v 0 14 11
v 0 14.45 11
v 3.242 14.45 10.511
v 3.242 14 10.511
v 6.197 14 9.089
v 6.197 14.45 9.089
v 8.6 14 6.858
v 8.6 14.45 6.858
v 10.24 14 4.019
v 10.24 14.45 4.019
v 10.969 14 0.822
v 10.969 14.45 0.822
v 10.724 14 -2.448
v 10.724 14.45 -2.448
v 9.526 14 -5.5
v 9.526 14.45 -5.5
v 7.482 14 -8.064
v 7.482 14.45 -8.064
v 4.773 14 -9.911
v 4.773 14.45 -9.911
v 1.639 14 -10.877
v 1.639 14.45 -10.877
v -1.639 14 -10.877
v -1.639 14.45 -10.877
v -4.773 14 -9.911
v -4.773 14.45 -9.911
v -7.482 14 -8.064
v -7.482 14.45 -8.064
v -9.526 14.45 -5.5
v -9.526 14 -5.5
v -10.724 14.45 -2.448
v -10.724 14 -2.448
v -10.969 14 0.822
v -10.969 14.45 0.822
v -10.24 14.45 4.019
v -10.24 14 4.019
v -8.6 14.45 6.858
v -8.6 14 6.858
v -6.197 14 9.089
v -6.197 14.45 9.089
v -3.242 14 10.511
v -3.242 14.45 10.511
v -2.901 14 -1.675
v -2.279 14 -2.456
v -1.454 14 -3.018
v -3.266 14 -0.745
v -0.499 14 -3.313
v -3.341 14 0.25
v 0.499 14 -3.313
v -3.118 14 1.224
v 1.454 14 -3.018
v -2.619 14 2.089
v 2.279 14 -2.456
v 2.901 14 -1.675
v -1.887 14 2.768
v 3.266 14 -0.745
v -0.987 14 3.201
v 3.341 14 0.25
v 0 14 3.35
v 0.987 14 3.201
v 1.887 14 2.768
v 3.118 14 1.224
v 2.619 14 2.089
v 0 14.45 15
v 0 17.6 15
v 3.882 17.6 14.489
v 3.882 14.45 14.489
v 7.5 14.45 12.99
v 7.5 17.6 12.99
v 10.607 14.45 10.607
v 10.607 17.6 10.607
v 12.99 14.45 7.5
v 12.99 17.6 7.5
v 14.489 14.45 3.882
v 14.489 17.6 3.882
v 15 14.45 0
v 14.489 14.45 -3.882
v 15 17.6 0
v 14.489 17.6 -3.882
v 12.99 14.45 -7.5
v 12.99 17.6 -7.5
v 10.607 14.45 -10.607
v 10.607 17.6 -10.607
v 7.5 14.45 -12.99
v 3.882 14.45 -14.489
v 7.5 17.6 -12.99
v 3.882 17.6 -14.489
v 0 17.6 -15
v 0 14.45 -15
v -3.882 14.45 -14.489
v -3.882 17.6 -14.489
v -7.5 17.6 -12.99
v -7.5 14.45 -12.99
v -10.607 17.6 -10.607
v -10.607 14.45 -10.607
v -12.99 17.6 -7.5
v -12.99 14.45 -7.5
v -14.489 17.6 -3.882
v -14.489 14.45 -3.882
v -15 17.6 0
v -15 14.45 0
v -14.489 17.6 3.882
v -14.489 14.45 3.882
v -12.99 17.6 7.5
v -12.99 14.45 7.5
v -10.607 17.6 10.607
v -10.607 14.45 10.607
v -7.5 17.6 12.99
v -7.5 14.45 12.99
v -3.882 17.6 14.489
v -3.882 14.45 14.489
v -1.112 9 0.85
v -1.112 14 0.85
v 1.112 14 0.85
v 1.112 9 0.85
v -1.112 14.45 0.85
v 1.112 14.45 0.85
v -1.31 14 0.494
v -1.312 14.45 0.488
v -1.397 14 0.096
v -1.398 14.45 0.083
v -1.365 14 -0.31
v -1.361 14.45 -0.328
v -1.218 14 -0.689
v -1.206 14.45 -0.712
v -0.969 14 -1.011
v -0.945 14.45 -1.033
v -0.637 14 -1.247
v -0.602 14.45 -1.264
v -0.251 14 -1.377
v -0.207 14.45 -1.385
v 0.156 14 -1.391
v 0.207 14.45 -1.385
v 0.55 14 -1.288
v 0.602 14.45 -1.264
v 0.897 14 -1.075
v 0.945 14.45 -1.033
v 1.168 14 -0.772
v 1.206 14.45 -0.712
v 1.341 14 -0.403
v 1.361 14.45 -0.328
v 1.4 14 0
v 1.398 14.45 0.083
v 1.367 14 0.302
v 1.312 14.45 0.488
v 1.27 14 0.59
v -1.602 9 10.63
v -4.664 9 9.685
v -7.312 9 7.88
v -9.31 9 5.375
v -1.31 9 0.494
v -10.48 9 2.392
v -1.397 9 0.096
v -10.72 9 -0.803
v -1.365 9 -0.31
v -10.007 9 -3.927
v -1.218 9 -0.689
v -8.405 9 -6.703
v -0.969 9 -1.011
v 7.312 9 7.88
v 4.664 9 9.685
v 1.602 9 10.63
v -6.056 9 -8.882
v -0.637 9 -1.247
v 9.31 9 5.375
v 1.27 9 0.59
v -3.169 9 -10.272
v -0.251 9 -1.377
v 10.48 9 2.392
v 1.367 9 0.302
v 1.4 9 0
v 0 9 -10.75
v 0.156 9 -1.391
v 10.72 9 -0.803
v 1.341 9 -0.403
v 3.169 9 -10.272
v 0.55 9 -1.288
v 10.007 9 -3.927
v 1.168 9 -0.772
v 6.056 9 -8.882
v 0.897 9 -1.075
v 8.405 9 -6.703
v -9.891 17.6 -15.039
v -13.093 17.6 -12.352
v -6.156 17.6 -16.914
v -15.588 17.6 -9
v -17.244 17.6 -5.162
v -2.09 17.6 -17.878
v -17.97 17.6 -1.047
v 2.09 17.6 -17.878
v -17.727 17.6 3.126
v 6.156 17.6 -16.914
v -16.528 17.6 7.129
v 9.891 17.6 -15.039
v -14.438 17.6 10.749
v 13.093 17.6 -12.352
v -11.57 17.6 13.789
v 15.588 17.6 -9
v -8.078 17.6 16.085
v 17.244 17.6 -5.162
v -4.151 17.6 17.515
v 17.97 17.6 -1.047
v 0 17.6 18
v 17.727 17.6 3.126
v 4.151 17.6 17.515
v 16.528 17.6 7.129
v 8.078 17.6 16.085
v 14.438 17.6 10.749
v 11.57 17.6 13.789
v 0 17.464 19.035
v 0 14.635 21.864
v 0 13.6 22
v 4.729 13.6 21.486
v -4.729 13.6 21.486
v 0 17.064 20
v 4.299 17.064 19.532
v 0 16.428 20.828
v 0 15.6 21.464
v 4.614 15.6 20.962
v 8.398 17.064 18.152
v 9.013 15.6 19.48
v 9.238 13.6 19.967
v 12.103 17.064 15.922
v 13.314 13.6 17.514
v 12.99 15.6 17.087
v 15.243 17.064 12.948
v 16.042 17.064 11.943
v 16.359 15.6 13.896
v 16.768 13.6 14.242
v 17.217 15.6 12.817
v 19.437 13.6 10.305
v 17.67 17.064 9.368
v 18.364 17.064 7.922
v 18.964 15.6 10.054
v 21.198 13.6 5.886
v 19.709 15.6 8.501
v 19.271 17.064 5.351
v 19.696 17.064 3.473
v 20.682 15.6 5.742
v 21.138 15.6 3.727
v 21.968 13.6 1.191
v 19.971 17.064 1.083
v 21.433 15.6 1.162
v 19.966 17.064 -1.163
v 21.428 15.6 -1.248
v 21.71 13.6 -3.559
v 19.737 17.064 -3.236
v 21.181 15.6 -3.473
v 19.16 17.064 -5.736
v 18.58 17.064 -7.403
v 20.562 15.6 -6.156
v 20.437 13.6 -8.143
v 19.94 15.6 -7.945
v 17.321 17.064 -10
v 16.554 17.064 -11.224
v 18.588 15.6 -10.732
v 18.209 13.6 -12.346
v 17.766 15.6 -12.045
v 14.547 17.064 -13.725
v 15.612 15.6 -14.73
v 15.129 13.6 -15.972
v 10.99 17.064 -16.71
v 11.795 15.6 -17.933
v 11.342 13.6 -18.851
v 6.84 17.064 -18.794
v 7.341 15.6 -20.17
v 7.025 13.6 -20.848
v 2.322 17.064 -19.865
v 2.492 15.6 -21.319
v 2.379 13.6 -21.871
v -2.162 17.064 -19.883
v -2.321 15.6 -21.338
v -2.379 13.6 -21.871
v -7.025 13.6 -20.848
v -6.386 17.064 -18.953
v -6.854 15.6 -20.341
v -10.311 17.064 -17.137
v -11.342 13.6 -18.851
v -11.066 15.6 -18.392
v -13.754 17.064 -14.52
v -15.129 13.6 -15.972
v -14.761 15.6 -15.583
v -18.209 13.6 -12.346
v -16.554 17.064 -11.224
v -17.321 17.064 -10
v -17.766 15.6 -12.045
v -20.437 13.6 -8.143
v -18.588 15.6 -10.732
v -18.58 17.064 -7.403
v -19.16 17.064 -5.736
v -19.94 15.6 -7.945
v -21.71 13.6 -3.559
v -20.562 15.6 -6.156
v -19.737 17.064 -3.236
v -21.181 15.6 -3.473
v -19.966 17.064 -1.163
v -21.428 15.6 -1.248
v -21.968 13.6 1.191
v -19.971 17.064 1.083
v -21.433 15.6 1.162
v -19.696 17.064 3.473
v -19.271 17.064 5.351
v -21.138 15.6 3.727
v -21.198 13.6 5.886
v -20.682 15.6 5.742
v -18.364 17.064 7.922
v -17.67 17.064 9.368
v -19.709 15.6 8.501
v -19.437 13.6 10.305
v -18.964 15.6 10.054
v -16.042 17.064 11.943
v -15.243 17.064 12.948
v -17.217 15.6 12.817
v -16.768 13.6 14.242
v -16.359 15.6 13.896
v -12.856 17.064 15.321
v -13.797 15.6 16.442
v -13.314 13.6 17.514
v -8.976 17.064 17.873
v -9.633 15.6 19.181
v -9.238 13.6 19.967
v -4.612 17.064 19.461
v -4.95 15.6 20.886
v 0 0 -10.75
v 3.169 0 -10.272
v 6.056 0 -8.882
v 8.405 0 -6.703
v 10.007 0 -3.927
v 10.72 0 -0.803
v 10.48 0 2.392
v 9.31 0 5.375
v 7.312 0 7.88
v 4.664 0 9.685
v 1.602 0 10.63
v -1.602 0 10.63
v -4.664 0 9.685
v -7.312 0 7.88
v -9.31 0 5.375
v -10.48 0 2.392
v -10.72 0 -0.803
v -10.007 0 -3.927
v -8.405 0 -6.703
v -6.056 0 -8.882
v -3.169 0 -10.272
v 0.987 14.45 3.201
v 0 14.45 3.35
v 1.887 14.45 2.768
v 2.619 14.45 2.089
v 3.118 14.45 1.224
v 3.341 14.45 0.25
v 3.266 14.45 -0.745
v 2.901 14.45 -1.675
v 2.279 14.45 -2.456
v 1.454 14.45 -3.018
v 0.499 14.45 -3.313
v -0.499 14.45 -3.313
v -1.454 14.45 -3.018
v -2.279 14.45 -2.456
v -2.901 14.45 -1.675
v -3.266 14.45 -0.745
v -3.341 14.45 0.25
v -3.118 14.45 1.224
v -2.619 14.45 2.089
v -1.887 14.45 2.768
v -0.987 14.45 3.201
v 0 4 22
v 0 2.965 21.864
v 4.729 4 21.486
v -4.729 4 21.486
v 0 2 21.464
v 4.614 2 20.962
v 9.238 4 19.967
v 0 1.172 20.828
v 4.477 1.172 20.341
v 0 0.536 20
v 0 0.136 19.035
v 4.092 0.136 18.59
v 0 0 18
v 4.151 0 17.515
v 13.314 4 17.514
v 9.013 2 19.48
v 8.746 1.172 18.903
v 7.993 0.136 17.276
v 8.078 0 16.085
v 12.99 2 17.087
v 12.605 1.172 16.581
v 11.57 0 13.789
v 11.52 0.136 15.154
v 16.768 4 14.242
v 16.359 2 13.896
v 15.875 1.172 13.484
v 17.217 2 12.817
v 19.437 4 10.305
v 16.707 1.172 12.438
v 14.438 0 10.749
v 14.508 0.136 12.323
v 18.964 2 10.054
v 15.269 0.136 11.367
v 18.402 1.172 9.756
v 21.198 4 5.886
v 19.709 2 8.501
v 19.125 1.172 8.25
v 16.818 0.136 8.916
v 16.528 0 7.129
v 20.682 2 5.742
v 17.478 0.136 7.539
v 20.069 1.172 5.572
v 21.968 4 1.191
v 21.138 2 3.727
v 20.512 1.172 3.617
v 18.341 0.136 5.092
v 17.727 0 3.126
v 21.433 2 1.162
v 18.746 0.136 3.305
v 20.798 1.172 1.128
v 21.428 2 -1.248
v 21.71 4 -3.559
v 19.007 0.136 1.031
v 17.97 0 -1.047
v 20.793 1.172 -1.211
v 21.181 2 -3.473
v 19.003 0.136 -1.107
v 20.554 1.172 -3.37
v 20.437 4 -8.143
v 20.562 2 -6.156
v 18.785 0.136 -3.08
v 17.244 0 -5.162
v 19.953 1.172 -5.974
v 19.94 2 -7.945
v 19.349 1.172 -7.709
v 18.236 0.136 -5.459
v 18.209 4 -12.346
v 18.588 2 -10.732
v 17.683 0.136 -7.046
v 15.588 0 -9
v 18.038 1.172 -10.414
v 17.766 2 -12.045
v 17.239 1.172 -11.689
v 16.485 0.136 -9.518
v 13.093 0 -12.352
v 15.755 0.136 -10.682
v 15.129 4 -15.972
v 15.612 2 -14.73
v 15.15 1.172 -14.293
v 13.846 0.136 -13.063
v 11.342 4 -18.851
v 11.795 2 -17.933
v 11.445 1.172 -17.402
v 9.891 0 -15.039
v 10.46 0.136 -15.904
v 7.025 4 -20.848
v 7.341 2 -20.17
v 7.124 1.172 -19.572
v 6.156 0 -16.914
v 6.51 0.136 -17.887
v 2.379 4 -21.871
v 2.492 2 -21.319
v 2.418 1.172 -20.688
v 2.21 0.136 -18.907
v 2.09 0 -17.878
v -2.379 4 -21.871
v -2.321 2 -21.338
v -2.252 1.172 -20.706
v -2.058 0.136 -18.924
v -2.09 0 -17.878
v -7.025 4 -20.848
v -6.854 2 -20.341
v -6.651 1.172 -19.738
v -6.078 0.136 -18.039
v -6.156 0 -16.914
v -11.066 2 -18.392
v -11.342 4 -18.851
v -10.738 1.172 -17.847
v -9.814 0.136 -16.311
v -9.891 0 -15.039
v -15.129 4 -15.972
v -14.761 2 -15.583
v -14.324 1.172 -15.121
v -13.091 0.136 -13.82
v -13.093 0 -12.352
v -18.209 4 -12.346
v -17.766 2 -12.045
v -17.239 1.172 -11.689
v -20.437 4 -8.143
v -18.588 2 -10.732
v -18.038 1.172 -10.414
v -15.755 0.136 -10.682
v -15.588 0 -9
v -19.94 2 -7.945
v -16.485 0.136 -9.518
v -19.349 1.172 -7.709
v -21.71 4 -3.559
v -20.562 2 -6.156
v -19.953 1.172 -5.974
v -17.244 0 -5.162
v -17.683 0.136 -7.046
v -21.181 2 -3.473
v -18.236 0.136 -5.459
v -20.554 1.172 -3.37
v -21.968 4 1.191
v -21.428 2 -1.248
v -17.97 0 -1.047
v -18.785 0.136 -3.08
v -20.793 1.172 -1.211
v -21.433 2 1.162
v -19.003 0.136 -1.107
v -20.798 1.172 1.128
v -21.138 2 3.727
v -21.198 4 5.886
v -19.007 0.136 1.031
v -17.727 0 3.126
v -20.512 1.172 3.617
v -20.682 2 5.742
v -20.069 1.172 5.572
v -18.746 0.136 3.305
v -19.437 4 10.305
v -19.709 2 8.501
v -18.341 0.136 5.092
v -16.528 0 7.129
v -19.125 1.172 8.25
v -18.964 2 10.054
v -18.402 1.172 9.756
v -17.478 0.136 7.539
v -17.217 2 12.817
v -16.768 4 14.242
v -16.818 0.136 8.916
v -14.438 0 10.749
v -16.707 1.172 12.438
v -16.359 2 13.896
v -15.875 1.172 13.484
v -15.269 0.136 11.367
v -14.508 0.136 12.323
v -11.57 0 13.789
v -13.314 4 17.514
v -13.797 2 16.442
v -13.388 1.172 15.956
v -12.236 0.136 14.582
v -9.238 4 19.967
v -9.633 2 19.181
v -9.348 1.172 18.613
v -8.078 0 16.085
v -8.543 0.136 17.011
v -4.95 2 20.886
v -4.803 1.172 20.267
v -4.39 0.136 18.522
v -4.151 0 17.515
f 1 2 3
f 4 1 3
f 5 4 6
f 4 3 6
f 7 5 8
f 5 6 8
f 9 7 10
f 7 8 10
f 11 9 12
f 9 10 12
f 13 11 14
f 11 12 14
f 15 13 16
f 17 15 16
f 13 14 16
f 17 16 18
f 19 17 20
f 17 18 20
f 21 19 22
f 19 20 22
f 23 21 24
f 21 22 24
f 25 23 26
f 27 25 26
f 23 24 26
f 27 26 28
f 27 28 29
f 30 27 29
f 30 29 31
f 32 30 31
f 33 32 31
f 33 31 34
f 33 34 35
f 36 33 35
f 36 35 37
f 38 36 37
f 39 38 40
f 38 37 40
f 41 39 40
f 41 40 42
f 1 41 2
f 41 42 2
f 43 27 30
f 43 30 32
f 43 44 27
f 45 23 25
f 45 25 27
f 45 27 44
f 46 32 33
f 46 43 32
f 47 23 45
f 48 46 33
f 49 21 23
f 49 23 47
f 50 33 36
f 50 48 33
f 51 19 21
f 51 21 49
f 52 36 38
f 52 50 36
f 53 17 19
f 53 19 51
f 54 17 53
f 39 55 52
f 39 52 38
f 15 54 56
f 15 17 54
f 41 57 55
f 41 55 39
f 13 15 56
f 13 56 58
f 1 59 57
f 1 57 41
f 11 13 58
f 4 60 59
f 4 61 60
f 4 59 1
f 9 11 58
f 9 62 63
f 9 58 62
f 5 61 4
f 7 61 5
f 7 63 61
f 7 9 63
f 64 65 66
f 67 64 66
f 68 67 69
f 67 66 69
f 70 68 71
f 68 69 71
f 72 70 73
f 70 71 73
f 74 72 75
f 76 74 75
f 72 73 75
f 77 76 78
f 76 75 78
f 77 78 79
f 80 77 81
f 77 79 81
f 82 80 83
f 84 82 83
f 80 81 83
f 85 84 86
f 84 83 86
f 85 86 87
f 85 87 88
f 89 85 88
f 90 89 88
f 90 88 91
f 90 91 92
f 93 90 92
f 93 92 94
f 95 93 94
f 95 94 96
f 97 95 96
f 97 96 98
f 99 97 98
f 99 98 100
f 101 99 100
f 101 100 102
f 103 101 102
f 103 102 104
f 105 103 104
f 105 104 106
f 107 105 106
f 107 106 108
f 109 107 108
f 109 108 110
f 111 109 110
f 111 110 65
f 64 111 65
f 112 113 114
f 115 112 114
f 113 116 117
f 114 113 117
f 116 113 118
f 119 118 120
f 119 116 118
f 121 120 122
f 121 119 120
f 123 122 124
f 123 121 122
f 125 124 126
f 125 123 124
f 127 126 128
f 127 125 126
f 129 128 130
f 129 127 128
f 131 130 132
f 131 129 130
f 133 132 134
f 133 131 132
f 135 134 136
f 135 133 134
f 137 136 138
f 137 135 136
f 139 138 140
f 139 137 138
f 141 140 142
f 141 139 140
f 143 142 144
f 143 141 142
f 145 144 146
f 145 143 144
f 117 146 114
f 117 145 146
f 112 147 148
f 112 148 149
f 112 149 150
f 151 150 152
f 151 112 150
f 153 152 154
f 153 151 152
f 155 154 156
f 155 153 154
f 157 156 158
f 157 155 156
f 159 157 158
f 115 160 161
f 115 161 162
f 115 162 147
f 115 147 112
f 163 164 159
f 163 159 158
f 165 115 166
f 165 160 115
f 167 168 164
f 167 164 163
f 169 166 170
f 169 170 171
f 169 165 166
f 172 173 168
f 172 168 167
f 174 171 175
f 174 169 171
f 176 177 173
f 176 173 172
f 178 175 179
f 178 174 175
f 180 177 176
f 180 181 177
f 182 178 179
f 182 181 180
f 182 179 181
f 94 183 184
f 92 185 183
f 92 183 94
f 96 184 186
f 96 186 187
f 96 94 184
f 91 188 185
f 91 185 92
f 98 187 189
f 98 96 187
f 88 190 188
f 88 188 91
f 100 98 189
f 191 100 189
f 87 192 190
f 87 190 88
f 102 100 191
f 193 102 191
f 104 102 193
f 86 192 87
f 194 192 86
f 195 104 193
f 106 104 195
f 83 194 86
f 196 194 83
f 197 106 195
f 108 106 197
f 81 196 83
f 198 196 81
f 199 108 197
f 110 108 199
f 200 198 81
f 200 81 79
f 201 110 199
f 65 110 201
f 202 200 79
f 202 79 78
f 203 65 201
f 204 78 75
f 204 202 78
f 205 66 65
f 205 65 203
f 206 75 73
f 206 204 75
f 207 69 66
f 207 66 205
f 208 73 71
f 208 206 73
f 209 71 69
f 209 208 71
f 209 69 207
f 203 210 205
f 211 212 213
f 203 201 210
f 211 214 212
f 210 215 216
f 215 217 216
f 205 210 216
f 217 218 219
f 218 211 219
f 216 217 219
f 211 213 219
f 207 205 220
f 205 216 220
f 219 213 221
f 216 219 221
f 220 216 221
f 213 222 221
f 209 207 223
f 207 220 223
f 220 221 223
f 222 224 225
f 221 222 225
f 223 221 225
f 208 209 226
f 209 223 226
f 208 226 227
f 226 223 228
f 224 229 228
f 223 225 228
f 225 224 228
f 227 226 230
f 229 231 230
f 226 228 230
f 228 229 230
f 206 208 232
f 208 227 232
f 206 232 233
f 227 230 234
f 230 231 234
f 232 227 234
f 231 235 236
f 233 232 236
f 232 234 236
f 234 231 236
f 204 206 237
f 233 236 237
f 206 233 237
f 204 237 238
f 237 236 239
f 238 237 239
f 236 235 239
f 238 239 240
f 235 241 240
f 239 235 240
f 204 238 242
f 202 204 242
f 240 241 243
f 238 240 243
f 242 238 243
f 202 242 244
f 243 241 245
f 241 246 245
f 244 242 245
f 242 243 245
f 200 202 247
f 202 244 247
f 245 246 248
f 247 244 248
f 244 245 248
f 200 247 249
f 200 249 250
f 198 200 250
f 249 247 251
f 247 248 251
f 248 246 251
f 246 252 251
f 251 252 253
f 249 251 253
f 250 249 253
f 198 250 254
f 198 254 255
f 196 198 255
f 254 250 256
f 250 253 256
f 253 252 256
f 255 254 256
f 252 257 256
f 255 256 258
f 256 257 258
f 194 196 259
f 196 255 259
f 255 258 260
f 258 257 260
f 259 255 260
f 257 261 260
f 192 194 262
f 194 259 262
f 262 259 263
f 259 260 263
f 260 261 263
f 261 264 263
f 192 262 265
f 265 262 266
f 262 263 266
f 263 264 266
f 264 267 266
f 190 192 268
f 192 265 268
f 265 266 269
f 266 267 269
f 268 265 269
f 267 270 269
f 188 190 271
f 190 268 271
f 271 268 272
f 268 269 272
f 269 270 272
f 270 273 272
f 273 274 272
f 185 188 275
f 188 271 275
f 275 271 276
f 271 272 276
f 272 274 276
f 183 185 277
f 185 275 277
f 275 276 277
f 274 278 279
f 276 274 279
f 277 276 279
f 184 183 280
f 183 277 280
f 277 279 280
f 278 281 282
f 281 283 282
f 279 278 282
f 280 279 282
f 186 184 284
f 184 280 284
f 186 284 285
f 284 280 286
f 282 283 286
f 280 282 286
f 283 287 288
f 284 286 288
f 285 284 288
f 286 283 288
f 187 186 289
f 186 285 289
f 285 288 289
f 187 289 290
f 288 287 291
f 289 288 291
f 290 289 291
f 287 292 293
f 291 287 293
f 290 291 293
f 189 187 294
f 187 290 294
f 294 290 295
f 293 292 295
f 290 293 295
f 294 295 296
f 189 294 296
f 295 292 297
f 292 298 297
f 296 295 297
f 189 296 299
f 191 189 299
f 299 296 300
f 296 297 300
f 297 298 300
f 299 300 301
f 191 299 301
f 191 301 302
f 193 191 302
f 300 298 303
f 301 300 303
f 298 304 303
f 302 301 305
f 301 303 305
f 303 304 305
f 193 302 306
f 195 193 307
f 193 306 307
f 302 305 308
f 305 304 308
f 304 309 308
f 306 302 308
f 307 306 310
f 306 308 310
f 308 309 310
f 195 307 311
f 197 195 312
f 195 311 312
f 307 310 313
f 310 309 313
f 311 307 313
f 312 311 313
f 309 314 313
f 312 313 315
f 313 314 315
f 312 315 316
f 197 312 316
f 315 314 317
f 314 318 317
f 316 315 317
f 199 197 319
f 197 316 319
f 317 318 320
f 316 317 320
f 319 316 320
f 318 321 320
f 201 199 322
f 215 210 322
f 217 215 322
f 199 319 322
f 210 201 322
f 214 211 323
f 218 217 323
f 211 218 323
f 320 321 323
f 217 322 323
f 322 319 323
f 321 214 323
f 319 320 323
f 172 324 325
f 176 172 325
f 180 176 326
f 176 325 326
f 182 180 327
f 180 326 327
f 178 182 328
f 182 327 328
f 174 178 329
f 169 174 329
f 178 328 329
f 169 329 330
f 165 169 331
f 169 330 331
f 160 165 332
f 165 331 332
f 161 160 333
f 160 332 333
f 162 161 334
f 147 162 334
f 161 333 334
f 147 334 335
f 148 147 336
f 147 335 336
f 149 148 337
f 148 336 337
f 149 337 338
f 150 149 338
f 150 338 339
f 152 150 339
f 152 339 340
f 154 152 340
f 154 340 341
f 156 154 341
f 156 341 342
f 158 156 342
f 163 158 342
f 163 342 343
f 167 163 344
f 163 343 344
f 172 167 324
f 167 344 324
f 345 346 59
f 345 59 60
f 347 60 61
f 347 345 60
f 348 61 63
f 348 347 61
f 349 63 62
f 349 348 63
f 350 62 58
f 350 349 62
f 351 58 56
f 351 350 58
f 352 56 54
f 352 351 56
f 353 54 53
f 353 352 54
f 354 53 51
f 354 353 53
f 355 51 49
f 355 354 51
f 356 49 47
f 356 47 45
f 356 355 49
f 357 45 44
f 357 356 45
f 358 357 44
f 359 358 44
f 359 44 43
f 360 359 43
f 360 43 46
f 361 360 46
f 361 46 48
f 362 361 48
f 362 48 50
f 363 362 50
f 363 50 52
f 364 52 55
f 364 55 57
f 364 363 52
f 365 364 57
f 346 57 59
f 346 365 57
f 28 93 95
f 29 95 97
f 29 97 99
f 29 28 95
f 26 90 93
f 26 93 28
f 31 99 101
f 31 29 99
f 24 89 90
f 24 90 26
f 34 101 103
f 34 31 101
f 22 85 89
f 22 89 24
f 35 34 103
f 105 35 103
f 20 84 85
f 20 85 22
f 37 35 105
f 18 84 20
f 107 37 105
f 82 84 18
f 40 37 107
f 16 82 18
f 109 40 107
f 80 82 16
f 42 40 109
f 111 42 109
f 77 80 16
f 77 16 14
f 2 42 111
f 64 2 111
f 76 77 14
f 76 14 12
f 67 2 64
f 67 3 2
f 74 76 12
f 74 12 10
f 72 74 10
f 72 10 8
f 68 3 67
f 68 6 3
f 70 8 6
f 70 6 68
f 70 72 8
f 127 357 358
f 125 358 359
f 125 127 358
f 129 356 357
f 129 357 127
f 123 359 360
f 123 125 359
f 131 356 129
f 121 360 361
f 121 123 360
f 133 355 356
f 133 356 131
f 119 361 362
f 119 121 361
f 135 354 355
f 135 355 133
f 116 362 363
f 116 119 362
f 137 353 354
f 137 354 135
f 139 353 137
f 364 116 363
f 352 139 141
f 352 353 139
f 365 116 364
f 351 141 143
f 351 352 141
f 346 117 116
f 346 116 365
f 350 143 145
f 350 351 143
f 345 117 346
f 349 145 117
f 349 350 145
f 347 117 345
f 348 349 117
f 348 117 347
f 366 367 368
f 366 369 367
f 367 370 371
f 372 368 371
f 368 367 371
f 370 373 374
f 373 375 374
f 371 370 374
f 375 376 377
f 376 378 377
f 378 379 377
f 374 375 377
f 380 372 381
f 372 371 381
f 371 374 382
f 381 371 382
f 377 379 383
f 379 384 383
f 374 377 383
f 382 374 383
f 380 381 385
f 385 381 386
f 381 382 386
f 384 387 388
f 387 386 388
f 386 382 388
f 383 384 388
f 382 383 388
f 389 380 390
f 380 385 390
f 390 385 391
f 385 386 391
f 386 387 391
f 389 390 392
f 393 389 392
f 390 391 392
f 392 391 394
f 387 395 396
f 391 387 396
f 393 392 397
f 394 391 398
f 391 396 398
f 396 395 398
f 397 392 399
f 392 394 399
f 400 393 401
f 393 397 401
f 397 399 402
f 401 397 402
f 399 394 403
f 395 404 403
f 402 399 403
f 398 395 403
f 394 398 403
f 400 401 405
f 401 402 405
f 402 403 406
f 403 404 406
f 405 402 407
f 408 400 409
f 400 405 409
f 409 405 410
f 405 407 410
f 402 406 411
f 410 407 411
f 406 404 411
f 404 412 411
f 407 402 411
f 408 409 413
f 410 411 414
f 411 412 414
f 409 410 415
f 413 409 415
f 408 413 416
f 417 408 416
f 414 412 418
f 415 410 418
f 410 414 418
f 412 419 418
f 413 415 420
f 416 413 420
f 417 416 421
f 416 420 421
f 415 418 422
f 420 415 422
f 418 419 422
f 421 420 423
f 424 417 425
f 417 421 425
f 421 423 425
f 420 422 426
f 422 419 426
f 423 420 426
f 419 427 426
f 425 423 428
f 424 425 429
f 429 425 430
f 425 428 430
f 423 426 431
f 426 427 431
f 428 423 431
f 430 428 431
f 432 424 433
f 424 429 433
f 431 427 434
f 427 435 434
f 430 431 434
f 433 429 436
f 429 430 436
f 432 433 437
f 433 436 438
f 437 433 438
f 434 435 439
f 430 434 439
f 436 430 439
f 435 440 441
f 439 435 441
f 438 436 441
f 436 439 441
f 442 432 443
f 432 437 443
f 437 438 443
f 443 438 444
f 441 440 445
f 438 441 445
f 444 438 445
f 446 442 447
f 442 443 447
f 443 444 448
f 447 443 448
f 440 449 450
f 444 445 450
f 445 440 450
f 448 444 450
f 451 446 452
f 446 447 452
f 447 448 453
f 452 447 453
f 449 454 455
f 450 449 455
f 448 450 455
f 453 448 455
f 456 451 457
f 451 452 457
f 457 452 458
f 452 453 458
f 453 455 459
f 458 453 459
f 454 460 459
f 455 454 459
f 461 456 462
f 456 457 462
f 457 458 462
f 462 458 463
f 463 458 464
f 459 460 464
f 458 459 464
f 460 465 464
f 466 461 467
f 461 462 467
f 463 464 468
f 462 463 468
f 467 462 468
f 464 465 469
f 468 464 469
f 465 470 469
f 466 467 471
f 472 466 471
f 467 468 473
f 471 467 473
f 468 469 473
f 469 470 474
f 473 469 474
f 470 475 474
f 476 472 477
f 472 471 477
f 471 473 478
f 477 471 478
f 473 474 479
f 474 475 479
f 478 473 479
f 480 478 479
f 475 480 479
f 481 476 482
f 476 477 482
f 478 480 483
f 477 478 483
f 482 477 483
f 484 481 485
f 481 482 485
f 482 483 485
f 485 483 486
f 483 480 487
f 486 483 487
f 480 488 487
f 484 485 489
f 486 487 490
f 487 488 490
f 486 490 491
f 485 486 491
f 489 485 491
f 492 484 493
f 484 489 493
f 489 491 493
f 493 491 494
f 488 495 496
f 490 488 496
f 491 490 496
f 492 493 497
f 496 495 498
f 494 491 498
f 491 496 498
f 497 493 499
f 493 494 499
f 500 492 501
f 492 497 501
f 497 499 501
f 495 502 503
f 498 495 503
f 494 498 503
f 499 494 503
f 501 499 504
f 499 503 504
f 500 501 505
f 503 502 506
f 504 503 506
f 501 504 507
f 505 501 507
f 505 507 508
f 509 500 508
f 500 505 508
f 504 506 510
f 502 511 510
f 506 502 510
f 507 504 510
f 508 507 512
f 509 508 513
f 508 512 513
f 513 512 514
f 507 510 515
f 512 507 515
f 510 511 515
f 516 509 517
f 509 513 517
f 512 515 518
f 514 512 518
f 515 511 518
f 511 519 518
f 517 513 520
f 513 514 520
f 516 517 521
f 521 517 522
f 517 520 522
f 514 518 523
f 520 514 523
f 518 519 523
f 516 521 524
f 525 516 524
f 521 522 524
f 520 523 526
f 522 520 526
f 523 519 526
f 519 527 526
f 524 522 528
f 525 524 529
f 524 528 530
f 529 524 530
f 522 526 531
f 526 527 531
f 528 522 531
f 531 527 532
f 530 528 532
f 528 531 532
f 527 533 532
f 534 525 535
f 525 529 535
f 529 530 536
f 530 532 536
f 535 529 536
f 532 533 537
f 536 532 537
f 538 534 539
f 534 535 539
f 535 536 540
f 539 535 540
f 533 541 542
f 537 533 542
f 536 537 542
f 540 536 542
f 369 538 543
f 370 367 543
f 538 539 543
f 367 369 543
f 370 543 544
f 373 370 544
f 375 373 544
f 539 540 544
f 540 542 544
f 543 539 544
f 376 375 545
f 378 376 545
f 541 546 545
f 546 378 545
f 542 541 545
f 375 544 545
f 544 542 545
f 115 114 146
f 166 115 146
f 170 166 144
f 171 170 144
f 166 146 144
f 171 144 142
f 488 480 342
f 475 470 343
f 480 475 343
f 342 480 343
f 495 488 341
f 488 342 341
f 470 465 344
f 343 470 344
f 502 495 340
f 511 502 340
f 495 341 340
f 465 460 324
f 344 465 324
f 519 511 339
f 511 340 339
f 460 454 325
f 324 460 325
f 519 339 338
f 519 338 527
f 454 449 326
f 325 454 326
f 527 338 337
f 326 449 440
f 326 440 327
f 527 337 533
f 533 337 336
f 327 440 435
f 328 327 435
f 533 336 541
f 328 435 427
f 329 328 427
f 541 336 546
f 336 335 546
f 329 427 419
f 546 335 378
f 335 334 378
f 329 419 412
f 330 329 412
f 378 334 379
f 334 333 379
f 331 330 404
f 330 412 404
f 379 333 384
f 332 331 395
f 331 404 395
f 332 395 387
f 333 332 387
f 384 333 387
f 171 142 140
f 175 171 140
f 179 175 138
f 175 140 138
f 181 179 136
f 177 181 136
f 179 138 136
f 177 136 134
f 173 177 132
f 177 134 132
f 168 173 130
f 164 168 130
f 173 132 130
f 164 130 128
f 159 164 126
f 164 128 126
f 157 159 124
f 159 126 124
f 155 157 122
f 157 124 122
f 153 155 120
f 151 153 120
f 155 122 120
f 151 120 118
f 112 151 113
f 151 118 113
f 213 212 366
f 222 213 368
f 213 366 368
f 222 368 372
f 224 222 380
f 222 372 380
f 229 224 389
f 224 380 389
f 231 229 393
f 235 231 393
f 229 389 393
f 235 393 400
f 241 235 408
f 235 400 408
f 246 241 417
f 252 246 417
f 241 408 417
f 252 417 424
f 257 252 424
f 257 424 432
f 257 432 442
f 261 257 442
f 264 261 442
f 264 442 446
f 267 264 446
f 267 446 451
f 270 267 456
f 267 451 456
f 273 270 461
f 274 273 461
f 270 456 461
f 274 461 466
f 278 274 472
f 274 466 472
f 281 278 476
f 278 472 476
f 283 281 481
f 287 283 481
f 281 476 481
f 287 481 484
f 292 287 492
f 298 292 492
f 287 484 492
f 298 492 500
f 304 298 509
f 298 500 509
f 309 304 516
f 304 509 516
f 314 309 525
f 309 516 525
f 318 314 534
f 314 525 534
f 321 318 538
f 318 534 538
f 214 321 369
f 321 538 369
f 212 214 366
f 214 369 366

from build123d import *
from build123d.topology import SkipClean

# Parameters (mm, degrees)
SKETCH1_R           = 22
BOSS_EXTRUDE1_DEPTH = 17.6
SKETCH2_R           = 15
CUT_EXTRUDE1_DEPTH  = 3.6
CUT_EXTRUDE2_DEPTH  = 37.18
BOSS_EXTRUDE2_START = 0.45
SKETCH4_R           = 15
SKETCH4_R_2         = 11
SKETCH4_R_3         = 3.35
BOSS_EXTRUDE2_DEPTH = 0.45
SKETCH5_R           = 10.75
CUT_EXTRUDE3_DEPTH  = 9
FILLET1_R           = 4


with BuildPart() as part:
    # Sketch1 → Boss-Extrude1 (new body)
    with BuildSketch(Plane(origin=(0, 0, 0), x_dir=(1, 0, 0), z_dir=(0, 1, 0))):
        with Locations(Location((0, 0, 0), (0, 0, 270))):
            Circle(SKETCH1_R)
    extrude(amount=BOSS_EXTRUDE1_DEPTH)

    # Sketch2 → Cut-Extrude1 (cut)
    with BuildSketch(Plane(origin=(0, 17.6, 0), x_dir=(1, 0, 0), z_dir=(0, 1, 0))):
        with Locations(Location((0, 0, 0), (0, 0, 270))):
            Circle(SKETCH2_R)
    extrude(amount=-CUT_EXTRUDE1_DEPTH, mode=Mode.SUBTRACT)

    # Sketch3 → Cut-Extrude2 (cut)
    with BuildSketch(Plane(origin=(0, 14, 0), x_dir=(1, 0, 0), z_dir=(0, 1, 0))):
        with BuildLine():
            ThreePointArc((1.4, 0), (-0.448663748, 1.326160187), (-1.112429773, -0.85))
            Line((-1.112429773, -0.85), (1.112429773, -0.85))
            ThreePointArc((1.112429773, -0.85), (1.326160187, -0.448663748), (1.4, 0))
        make_face()
    extrude(amount=-CUT_EXTRUDE2_DEPTH, mode=Mode.SUBTRACT)

    # Sketch4 → Boss-Extrude2 (add)
    # profile 1 of 2: a face of its own
    with SkipClean():  # the faces are left unmerged after this step: merging them gives an invalid solid
        with BuildSketch(Plane(origin=(0, 14, 0), x_dir=(1, 0, 0), z_dir=(0, 1, 0)).offset(BOSS_EXTRUDE2_START)):
            with Locations(Location((0, 0, 0), (0, 0, 270))):
                Circle(SKETCH4_R)
            with Locations(Location((0, 0, 0), (0, 0, 270))):
                Circle(SKETCH4_R_2, mode=Mode.SUBTRACT)
        # profile 2 of 2: a face of its own
        with BuildSketch(Plane(origin=(0, 14, 0), x_dir=(1, 0, 0), z_dir=(0, 1, 0)).offset(BOSS_EXTRUDE2_START)):
            with Locations(Location((0, 0, 0), (0, 0, 270))):
                Circle(SKETCH4_R_3)
            with BuildLine():
                Line((1.112429773, -0.85), (-1.112429773, -0.85))
                ThreePointArc((-1.112429773, -0.85), (0, 1.4), (1.112429773, -0.85))
            make_face(mode=Mode.SUBTRACT)
        extrude(amount=-BOSS_EXTRUDE2_DEPTH)

    # Sketch5 → Cut-Extrude3 (cut)
    with SkipClean():  # the faces are left unmerged after this step: merging them gives an invalid solid
        with BuildSketch(Plane.XZ):
            with Locations(Location((0, 0, 0), (0, 0, 270))):
                Circle(SKETCH5_R)
        extrude(amount=-CUT_EXTRUDE3_DEPTH, mode=Mode.SUBTRACT)

    # Fillet1
    fillet1_edges = [part.edges().sort_by_distance(p)[0] for p in [
        (0, 0, -22),
        (0, 17.6, -22),
    ]]
    fillet(fillet1_edges, radius=FILLET1_R)


solid = part.part
